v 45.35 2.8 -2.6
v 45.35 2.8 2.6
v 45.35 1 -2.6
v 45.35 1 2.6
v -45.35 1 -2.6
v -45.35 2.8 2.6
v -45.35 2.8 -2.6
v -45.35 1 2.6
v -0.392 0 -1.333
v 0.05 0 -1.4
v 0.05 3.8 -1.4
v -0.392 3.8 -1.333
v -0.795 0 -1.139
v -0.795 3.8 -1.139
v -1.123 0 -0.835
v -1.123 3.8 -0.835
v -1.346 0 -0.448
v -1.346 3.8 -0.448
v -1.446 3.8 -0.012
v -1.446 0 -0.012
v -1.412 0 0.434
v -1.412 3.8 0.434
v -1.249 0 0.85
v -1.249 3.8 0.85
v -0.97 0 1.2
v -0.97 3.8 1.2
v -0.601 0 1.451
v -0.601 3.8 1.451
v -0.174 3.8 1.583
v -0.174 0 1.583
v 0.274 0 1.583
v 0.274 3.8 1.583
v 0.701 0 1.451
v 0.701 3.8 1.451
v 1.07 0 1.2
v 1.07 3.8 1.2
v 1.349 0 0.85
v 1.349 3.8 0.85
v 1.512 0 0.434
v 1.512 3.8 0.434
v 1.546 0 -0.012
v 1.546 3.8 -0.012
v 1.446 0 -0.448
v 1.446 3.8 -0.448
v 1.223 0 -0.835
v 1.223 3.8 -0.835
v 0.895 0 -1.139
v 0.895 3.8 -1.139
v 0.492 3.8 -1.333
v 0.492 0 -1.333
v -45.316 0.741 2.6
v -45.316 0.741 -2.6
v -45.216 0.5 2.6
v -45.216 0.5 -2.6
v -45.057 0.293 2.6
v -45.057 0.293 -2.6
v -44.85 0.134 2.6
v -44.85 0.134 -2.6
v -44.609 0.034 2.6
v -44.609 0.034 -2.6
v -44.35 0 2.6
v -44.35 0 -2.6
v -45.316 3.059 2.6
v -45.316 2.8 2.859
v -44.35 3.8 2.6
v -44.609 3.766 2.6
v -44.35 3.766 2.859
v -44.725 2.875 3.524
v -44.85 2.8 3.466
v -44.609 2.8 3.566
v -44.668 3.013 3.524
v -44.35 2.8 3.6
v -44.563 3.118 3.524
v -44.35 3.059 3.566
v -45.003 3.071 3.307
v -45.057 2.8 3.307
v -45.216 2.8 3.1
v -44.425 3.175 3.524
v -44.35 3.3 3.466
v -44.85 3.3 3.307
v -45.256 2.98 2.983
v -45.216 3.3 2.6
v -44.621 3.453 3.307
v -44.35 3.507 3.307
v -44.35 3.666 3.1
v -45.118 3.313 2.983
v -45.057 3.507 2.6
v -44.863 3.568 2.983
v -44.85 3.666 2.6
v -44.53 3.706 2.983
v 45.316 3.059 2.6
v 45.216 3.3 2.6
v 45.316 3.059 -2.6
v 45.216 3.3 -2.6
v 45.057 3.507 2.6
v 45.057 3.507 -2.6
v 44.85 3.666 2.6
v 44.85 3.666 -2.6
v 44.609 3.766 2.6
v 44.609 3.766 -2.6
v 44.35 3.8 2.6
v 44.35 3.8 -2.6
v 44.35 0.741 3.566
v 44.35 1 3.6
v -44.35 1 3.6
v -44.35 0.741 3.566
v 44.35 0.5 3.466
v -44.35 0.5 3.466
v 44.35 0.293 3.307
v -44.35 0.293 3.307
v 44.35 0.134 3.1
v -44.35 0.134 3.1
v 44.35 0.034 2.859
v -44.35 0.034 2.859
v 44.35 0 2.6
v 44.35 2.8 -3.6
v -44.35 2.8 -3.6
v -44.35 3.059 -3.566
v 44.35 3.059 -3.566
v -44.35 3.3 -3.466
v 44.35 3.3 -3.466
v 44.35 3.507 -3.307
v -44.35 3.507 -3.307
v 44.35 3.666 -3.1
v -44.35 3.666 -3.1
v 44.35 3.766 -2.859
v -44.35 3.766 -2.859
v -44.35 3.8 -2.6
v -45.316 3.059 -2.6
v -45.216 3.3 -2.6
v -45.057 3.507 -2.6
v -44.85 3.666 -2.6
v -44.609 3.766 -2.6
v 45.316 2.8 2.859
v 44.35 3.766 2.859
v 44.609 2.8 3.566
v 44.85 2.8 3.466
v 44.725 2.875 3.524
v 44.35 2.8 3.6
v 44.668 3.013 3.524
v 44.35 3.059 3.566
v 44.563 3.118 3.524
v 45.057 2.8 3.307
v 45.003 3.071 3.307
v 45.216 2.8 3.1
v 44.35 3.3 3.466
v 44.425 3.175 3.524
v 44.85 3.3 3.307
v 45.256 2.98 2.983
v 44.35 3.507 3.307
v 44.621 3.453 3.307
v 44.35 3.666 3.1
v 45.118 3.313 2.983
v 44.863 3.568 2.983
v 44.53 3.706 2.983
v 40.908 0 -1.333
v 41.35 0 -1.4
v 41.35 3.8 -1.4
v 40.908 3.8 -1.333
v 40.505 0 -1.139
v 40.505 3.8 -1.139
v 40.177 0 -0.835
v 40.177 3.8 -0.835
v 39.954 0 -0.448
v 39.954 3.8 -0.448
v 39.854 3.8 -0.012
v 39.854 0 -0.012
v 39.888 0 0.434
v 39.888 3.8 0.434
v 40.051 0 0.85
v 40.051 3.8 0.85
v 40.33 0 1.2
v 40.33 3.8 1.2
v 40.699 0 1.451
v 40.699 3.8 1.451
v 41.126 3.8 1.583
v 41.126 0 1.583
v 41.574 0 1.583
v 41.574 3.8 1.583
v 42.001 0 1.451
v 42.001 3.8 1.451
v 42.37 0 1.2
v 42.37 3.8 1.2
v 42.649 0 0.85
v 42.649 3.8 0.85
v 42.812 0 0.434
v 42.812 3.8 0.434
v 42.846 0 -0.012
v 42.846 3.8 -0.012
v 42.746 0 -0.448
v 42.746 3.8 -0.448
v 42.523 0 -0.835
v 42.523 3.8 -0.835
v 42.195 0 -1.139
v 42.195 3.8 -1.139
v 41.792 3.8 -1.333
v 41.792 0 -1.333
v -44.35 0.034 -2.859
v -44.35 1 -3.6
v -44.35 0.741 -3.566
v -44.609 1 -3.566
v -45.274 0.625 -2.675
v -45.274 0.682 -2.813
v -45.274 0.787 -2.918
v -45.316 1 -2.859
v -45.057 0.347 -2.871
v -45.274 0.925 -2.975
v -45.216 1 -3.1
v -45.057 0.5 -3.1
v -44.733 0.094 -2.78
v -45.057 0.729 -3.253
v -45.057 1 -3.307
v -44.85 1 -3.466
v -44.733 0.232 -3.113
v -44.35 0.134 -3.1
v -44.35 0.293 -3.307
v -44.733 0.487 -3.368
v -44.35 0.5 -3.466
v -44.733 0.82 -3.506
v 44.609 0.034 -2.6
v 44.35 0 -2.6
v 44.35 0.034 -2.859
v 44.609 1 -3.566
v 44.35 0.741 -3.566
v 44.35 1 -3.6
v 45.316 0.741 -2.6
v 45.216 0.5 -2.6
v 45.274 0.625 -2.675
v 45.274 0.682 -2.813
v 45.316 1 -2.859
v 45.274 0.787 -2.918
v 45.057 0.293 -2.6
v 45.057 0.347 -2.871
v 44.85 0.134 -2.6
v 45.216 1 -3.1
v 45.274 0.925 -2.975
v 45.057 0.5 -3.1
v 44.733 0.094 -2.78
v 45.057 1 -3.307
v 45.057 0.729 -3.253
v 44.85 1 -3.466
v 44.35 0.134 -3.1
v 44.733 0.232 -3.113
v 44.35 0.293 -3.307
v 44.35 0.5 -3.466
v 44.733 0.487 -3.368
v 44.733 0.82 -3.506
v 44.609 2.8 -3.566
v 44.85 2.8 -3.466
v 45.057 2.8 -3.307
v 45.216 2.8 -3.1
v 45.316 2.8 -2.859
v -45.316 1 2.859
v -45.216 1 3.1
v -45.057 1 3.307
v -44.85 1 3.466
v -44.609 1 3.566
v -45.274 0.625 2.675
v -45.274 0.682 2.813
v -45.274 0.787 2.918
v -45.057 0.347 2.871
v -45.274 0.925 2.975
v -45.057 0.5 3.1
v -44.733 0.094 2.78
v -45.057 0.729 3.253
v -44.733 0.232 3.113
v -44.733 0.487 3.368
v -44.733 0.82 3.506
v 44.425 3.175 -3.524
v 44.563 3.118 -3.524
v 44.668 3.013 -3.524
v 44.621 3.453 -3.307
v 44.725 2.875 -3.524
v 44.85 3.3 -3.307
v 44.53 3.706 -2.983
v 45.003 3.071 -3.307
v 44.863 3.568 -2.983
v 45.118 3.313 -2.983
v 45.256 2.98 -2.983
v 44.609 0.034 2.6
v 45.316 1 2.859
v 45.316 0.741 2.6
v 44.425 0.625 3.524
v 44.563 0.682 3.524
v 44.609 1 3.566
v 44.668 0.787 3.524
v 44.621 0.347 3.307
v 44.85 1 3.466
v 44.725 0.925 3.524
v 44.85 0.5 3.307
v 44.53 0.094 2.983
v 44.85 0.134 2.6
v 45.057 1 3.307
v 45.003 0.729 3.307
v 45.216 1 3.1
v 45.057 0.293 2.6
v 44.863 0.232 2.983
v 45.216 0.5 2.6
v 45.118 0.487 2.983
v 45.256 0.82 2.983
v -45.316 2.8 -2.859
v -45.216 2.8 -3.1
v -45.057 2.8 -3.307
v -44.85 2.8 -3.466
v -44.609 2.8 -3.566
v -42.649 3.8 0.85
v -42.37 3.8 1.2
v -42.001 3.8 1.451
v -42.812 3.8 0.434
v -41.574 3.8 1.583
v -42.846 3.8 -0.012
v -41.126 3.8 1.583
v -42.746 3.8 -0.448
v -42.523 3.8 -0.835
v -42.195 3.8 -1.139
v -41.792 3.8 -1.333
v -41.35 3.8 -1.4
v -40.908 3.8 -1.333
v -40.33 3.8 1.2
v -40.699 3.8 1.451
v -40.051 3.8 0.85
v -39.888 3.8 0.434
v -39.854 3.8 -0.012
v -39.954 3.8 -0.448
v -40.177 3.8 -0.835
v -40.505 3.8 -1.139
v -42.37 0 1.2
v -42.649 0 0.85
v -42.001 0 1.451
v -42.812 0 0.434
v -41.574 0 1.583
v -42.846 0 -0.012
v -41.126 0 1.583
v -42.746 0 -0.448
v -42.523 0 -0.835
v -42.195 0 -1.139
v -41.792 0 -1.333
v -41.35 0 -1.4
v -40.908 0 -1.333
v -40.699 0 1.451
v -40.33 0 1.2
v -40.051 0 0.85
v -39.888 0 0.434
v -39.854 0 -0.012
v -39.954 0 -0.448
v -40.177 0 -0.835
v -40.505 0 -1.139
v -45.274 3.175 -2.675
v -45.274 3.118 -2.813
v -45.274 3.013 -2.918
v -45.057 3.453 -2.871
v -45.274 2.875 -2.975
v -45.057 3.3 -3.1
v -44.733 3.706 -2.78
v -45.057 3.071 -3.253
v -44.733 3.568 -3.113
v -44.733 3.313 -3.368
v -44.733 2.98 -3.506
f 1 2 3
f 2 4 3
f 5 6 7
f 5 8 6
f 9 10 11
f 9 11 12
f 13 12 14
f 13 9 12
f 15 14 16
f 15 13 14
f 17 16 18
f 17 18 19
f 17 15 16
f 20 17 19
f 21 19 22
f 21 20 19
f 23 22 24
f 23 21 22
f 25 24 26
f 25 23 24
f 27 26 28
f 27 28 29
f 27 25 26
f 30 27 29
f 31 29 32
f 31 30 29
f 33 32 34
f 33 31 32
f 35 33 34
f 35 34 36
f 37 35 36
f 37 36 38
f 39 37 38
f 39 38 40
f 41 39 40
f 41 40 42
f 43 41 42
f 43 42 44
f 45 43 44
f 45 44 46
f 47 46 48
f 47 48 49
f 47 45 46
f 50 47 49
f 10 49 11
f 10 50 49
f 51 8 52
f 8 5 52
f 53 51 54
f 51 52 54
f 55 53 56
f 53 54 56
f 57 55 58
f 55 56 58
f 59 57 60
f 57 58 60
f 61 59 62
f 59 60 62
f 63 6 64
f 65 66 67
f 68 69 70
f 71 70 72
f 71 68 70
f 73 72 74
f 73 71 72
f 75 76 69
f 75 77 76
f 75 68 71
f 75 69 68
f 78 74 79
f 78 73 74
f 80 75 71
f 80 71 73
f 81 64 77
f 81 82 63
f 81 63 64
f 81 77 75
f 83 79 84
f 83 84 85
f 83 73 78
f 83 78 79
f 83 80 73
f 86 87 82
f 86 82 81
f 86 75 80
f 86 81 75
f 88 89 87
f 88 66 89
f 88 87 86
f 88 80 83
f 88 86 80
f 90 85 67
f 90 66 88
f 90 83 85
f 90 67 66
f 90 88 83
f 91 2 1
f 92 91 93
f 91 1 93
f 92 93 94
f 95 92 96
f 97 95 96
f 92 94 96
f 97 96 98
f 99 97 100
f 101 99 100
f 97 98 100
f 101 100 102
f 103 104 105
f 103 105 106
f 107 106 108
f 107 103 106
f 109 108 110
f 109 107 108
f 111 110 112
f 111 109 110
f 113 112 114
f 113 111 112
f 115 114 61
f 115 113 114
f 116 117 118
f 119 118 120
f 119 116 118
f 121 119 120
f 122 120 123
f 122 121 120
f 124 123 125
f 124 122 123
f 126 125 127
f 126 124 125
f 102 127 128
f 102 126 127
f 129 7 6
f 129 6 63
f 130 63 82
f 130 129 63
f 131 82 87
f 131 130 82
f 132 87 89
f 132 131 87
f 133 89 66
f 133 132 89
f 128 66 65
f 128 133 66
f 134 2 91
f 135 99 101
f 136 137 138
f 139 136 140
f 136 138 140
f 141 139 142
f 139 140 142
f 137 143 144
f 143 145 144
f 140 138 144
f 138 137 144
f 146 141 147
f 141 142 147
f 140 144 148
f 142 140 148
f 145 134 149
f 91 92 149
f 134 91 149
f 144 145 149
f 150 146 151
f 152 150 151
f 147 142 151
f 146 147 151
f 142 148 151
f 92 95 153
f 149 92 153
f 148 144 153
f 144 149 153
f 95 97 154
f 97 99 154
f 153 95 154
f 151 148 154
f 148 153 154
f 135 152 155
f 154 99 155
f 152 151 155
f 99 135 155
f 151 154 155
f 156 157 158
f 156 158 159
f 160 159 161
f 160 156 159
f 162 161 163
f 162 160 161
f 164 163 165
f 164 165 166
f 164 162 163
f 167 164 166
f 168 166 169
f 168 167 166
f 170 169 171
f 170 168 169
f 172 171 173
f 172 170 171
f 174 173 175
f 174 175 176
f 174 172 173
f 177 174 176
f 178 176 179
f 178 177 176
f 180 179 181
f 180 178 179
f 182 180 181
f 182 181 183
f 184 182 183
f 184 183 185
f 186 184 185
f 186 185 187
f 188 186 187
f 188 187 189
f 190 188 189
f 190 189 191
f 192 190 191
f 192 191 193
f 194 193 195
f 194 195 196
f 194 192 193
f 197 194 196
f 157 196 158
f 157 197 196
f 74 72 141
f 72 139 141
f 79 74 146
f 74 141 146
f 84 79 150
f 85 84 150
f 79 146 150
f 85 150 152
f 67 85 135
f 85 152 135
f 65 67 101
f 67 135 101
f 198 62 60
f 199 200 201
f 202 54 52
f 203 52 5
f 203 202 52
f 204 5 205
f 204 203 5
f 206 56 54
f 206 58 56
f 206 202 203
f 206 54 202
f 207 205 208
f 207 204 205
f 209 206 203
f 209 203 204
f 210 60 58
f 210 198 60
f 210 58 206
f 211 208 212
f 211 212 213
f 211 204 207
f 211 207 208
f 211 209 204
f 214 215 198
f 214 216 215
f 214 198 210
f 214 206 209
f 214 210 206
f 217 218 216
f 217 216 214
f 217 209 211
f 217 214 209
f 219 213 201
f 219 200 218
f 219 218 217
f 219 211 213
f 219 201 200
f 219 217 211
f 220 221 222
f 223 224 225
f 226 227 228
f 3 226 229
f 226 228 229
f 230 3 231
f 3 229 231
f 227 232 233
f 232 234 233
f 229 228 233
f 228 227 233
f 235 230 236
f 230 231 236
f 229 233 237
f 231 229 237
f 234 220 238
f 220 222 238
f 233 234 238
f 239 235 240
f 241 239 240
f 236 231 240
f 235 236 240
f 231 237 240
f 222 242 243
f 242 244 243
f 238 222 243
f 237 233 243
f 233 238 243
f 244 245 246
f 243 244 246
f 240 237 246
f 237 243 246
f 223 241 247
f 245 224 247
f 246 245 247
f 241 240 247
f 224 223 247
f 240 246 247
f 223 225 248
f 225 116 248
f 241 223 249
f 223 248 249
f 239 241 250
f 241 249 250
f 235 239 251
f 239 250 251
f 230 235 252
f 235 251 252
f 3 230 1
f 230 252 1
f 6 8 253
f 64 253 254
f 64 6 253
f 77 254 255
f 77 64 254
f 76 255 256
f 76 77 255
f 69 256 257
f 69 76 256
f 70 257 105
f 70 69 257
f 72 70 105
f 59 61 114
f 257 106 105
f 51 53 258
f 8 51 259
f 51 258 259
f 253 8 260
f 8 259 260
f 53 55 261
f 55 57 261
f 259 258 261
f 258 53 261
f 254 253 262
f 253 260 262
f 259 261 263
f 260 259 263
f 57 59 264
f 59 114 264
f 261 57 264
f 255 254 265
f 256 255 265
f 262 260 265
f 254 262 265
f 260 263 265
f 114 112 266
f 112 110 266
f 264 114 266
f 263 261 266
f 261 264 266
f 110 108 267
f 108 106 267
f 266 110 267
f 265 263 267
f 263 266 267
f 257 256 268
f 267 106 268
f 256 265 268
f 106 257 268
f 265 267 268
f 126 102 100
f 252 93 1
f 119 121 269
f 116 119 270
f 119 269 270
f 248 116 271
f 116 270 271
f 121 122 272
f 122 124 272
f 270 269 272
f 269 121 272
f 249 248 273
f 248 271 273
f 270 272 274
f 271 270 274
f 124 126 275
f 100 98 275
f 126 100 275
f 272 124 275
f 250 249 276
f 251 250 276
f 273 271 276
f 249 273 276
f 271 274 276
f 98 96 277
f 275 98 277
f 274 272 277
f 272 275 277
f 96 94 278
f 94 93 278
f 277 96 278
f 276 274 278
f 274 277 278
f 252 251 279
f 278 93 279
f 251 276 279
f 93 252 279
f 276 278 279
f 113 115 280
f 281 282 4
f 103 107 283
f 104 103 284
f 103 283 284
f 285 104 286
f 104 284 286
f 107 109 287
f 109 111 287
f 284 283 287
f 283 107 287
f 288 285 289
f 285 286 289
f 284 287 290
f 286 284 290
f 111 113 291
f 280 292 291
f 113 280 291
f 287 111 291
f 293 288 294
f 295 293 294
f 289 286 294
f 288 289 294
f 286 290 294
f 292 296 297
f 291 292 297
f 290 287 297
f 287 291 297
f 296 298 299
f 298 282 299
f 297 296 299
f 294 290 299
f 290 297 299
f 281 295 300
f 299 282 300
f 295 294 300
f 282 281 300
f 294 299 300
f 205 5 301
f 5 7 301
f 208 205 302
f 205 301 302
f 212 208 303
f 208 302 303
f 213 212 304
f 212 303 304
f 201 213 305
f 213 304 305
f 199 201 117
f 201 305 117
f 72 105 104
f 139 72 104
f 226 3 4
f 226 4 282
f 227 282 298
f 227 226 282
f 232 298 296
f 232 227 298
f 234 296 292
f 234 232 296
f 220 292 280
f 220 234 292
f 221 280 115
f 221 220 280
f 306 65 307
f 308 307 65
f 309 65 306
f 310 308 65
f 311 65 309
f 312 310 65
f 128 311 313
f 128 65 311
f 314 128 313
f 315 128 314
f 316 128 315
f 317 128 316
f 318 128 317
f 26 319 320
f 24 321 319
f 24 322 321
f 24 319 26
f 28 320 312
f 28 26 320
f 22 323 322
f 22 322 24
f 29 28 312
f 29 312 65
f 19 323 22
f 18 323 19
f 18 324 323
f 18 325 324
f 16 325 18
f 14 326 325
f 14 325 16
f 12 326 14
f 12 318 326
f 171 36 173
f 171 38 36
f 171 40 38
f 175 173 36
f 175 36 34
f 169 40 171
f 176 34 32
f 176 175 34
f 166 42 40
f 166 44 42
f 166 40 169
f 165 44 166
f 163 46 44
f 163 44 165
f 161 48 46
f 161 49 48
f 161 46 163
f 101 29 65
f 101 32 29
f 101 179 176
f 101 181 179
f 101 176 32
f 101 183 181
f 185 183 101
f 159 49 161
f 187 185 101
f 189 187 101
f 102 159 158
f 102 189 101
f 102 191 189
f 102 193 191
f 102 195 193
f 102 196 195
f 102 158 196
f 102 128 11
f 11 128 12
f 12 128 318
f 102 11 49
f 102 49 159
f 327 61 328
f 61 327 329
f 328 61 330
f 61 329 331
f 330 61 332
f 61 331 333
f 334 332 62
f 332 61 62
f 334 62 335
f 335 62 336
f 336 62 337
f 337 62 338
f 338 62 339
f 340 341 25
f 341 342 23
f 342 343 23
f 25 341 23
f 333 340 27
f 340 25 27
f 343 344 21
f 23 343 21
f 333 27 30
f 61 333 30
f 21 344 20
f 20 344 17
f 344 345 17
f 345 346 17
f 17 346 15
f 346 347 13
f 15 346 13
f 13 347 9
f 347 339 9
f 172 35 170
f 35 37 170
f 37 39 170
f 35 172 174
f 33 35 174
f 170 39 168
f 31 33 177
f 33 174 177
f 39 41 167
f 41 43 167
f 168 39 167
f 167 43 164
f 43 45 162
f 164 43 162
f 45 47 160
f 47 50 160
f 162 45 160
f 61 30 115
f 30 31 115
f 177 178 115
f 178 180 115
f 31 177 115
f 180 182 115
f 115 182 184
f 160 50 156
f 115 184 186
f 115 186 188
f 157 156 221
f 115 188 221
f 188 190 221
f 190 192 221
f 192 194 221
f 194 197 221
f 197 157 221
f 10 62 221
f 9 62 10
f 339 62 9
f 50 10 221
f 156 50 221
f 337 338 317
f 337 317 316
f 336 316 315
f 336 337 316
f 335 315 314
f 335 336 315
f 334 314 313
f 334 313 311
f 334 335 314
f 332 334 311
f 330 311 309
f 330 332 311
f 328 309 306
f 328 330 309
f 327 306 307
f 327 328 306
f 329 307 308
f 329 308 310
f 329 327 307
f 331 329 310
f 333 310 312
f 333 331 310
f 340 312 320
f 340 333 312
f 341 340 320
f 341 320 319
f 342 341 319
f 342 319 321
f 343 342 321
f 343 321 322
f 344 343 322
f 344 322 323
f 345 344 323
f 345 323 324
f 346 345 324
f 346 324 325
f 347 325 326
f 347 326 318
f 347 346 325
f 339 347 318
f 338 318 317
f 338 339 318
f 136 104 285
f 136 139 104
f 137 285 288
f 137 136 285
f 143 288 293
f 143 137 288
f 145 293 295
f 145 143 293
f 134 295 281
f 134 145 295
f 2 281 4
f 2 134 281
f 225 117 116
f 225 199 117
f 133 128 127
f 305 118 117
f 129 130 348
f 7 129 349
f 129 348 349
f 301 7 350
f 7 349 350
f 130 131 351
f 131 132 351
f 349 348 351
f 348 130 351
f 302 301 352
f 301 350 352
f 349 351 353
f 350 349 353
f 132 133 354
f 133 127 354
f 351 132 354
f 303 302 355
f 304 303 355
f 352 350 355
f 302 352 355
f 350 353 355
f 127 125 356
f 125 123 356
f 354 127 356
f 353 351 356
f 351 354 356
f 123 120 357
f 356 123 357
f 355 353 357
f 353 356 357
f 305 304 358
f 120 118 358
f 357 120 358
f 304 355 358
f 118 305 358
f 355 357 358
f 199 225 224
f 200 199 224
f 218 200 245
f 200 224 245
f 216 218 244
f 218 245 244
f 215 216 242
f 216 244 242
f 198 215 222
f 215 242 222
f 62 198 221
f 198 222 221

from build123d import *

# Parameters (mm, degrees)
SKETCH1_W           = 90.7
SKETCH1_H           = 7.2
SKETCH1_R           = 1.5
BOSS_EXTRUDE1_DEPTH = 3.8
FILLET1_R           = 1


with BuildPart() as part:
    # Sketch1 → Boss-Extrude1 (new body)
    with BuildSketch(Plane(origin=(0, 0, 0), x_dir=(1, 0, 0), z_dir=(0, 1, 0))):
        Rectangle(SKETCH1_W, SKETCH1_H)
        with Locations(Location((-41.35, -0.1, 0), (0, 0, 90))):
            Circle(SKETCH1_R, mode=Mode.SUBTRACT)
        with Locations(Location((0.05, -0.1, 0), (0, 0, 90))):
            Circle(SKETCH1_R, mode=Mode.SUBTRACT)
        with Locations(Location((41.35, -0.1, 0), (0, 0, 90))):
            Circle(SKETCH1_R, mode=Mode.SUBTRACT)
    extrude(amount=BOSS_EXTRUDE1_DEPTH)

    # Fillet1
    fillet1_edges = [part.edges().sort_by_distance(p)[0] for p in [
        (45.35, 3.8, 0),
        (0, 3.8, -3.6),
        (-45.35, 3.8, 0),
        (0, 0, -3.6),
        (45.35, 0, 0),
        (0, 0, 3.6),
        (-45.35, 0, 0),
        (-45.35, 1.9, -3.6),
        (45.35, 1.9, -3.6),
        (45.35, 1.9, 3.6),
        (-45.35, 1.9, 3.6),
        (0, 3.8, 3.6),
    ]]
    fillet(fillet1_edges, radius=FILLET1_R)


solid = part.part
